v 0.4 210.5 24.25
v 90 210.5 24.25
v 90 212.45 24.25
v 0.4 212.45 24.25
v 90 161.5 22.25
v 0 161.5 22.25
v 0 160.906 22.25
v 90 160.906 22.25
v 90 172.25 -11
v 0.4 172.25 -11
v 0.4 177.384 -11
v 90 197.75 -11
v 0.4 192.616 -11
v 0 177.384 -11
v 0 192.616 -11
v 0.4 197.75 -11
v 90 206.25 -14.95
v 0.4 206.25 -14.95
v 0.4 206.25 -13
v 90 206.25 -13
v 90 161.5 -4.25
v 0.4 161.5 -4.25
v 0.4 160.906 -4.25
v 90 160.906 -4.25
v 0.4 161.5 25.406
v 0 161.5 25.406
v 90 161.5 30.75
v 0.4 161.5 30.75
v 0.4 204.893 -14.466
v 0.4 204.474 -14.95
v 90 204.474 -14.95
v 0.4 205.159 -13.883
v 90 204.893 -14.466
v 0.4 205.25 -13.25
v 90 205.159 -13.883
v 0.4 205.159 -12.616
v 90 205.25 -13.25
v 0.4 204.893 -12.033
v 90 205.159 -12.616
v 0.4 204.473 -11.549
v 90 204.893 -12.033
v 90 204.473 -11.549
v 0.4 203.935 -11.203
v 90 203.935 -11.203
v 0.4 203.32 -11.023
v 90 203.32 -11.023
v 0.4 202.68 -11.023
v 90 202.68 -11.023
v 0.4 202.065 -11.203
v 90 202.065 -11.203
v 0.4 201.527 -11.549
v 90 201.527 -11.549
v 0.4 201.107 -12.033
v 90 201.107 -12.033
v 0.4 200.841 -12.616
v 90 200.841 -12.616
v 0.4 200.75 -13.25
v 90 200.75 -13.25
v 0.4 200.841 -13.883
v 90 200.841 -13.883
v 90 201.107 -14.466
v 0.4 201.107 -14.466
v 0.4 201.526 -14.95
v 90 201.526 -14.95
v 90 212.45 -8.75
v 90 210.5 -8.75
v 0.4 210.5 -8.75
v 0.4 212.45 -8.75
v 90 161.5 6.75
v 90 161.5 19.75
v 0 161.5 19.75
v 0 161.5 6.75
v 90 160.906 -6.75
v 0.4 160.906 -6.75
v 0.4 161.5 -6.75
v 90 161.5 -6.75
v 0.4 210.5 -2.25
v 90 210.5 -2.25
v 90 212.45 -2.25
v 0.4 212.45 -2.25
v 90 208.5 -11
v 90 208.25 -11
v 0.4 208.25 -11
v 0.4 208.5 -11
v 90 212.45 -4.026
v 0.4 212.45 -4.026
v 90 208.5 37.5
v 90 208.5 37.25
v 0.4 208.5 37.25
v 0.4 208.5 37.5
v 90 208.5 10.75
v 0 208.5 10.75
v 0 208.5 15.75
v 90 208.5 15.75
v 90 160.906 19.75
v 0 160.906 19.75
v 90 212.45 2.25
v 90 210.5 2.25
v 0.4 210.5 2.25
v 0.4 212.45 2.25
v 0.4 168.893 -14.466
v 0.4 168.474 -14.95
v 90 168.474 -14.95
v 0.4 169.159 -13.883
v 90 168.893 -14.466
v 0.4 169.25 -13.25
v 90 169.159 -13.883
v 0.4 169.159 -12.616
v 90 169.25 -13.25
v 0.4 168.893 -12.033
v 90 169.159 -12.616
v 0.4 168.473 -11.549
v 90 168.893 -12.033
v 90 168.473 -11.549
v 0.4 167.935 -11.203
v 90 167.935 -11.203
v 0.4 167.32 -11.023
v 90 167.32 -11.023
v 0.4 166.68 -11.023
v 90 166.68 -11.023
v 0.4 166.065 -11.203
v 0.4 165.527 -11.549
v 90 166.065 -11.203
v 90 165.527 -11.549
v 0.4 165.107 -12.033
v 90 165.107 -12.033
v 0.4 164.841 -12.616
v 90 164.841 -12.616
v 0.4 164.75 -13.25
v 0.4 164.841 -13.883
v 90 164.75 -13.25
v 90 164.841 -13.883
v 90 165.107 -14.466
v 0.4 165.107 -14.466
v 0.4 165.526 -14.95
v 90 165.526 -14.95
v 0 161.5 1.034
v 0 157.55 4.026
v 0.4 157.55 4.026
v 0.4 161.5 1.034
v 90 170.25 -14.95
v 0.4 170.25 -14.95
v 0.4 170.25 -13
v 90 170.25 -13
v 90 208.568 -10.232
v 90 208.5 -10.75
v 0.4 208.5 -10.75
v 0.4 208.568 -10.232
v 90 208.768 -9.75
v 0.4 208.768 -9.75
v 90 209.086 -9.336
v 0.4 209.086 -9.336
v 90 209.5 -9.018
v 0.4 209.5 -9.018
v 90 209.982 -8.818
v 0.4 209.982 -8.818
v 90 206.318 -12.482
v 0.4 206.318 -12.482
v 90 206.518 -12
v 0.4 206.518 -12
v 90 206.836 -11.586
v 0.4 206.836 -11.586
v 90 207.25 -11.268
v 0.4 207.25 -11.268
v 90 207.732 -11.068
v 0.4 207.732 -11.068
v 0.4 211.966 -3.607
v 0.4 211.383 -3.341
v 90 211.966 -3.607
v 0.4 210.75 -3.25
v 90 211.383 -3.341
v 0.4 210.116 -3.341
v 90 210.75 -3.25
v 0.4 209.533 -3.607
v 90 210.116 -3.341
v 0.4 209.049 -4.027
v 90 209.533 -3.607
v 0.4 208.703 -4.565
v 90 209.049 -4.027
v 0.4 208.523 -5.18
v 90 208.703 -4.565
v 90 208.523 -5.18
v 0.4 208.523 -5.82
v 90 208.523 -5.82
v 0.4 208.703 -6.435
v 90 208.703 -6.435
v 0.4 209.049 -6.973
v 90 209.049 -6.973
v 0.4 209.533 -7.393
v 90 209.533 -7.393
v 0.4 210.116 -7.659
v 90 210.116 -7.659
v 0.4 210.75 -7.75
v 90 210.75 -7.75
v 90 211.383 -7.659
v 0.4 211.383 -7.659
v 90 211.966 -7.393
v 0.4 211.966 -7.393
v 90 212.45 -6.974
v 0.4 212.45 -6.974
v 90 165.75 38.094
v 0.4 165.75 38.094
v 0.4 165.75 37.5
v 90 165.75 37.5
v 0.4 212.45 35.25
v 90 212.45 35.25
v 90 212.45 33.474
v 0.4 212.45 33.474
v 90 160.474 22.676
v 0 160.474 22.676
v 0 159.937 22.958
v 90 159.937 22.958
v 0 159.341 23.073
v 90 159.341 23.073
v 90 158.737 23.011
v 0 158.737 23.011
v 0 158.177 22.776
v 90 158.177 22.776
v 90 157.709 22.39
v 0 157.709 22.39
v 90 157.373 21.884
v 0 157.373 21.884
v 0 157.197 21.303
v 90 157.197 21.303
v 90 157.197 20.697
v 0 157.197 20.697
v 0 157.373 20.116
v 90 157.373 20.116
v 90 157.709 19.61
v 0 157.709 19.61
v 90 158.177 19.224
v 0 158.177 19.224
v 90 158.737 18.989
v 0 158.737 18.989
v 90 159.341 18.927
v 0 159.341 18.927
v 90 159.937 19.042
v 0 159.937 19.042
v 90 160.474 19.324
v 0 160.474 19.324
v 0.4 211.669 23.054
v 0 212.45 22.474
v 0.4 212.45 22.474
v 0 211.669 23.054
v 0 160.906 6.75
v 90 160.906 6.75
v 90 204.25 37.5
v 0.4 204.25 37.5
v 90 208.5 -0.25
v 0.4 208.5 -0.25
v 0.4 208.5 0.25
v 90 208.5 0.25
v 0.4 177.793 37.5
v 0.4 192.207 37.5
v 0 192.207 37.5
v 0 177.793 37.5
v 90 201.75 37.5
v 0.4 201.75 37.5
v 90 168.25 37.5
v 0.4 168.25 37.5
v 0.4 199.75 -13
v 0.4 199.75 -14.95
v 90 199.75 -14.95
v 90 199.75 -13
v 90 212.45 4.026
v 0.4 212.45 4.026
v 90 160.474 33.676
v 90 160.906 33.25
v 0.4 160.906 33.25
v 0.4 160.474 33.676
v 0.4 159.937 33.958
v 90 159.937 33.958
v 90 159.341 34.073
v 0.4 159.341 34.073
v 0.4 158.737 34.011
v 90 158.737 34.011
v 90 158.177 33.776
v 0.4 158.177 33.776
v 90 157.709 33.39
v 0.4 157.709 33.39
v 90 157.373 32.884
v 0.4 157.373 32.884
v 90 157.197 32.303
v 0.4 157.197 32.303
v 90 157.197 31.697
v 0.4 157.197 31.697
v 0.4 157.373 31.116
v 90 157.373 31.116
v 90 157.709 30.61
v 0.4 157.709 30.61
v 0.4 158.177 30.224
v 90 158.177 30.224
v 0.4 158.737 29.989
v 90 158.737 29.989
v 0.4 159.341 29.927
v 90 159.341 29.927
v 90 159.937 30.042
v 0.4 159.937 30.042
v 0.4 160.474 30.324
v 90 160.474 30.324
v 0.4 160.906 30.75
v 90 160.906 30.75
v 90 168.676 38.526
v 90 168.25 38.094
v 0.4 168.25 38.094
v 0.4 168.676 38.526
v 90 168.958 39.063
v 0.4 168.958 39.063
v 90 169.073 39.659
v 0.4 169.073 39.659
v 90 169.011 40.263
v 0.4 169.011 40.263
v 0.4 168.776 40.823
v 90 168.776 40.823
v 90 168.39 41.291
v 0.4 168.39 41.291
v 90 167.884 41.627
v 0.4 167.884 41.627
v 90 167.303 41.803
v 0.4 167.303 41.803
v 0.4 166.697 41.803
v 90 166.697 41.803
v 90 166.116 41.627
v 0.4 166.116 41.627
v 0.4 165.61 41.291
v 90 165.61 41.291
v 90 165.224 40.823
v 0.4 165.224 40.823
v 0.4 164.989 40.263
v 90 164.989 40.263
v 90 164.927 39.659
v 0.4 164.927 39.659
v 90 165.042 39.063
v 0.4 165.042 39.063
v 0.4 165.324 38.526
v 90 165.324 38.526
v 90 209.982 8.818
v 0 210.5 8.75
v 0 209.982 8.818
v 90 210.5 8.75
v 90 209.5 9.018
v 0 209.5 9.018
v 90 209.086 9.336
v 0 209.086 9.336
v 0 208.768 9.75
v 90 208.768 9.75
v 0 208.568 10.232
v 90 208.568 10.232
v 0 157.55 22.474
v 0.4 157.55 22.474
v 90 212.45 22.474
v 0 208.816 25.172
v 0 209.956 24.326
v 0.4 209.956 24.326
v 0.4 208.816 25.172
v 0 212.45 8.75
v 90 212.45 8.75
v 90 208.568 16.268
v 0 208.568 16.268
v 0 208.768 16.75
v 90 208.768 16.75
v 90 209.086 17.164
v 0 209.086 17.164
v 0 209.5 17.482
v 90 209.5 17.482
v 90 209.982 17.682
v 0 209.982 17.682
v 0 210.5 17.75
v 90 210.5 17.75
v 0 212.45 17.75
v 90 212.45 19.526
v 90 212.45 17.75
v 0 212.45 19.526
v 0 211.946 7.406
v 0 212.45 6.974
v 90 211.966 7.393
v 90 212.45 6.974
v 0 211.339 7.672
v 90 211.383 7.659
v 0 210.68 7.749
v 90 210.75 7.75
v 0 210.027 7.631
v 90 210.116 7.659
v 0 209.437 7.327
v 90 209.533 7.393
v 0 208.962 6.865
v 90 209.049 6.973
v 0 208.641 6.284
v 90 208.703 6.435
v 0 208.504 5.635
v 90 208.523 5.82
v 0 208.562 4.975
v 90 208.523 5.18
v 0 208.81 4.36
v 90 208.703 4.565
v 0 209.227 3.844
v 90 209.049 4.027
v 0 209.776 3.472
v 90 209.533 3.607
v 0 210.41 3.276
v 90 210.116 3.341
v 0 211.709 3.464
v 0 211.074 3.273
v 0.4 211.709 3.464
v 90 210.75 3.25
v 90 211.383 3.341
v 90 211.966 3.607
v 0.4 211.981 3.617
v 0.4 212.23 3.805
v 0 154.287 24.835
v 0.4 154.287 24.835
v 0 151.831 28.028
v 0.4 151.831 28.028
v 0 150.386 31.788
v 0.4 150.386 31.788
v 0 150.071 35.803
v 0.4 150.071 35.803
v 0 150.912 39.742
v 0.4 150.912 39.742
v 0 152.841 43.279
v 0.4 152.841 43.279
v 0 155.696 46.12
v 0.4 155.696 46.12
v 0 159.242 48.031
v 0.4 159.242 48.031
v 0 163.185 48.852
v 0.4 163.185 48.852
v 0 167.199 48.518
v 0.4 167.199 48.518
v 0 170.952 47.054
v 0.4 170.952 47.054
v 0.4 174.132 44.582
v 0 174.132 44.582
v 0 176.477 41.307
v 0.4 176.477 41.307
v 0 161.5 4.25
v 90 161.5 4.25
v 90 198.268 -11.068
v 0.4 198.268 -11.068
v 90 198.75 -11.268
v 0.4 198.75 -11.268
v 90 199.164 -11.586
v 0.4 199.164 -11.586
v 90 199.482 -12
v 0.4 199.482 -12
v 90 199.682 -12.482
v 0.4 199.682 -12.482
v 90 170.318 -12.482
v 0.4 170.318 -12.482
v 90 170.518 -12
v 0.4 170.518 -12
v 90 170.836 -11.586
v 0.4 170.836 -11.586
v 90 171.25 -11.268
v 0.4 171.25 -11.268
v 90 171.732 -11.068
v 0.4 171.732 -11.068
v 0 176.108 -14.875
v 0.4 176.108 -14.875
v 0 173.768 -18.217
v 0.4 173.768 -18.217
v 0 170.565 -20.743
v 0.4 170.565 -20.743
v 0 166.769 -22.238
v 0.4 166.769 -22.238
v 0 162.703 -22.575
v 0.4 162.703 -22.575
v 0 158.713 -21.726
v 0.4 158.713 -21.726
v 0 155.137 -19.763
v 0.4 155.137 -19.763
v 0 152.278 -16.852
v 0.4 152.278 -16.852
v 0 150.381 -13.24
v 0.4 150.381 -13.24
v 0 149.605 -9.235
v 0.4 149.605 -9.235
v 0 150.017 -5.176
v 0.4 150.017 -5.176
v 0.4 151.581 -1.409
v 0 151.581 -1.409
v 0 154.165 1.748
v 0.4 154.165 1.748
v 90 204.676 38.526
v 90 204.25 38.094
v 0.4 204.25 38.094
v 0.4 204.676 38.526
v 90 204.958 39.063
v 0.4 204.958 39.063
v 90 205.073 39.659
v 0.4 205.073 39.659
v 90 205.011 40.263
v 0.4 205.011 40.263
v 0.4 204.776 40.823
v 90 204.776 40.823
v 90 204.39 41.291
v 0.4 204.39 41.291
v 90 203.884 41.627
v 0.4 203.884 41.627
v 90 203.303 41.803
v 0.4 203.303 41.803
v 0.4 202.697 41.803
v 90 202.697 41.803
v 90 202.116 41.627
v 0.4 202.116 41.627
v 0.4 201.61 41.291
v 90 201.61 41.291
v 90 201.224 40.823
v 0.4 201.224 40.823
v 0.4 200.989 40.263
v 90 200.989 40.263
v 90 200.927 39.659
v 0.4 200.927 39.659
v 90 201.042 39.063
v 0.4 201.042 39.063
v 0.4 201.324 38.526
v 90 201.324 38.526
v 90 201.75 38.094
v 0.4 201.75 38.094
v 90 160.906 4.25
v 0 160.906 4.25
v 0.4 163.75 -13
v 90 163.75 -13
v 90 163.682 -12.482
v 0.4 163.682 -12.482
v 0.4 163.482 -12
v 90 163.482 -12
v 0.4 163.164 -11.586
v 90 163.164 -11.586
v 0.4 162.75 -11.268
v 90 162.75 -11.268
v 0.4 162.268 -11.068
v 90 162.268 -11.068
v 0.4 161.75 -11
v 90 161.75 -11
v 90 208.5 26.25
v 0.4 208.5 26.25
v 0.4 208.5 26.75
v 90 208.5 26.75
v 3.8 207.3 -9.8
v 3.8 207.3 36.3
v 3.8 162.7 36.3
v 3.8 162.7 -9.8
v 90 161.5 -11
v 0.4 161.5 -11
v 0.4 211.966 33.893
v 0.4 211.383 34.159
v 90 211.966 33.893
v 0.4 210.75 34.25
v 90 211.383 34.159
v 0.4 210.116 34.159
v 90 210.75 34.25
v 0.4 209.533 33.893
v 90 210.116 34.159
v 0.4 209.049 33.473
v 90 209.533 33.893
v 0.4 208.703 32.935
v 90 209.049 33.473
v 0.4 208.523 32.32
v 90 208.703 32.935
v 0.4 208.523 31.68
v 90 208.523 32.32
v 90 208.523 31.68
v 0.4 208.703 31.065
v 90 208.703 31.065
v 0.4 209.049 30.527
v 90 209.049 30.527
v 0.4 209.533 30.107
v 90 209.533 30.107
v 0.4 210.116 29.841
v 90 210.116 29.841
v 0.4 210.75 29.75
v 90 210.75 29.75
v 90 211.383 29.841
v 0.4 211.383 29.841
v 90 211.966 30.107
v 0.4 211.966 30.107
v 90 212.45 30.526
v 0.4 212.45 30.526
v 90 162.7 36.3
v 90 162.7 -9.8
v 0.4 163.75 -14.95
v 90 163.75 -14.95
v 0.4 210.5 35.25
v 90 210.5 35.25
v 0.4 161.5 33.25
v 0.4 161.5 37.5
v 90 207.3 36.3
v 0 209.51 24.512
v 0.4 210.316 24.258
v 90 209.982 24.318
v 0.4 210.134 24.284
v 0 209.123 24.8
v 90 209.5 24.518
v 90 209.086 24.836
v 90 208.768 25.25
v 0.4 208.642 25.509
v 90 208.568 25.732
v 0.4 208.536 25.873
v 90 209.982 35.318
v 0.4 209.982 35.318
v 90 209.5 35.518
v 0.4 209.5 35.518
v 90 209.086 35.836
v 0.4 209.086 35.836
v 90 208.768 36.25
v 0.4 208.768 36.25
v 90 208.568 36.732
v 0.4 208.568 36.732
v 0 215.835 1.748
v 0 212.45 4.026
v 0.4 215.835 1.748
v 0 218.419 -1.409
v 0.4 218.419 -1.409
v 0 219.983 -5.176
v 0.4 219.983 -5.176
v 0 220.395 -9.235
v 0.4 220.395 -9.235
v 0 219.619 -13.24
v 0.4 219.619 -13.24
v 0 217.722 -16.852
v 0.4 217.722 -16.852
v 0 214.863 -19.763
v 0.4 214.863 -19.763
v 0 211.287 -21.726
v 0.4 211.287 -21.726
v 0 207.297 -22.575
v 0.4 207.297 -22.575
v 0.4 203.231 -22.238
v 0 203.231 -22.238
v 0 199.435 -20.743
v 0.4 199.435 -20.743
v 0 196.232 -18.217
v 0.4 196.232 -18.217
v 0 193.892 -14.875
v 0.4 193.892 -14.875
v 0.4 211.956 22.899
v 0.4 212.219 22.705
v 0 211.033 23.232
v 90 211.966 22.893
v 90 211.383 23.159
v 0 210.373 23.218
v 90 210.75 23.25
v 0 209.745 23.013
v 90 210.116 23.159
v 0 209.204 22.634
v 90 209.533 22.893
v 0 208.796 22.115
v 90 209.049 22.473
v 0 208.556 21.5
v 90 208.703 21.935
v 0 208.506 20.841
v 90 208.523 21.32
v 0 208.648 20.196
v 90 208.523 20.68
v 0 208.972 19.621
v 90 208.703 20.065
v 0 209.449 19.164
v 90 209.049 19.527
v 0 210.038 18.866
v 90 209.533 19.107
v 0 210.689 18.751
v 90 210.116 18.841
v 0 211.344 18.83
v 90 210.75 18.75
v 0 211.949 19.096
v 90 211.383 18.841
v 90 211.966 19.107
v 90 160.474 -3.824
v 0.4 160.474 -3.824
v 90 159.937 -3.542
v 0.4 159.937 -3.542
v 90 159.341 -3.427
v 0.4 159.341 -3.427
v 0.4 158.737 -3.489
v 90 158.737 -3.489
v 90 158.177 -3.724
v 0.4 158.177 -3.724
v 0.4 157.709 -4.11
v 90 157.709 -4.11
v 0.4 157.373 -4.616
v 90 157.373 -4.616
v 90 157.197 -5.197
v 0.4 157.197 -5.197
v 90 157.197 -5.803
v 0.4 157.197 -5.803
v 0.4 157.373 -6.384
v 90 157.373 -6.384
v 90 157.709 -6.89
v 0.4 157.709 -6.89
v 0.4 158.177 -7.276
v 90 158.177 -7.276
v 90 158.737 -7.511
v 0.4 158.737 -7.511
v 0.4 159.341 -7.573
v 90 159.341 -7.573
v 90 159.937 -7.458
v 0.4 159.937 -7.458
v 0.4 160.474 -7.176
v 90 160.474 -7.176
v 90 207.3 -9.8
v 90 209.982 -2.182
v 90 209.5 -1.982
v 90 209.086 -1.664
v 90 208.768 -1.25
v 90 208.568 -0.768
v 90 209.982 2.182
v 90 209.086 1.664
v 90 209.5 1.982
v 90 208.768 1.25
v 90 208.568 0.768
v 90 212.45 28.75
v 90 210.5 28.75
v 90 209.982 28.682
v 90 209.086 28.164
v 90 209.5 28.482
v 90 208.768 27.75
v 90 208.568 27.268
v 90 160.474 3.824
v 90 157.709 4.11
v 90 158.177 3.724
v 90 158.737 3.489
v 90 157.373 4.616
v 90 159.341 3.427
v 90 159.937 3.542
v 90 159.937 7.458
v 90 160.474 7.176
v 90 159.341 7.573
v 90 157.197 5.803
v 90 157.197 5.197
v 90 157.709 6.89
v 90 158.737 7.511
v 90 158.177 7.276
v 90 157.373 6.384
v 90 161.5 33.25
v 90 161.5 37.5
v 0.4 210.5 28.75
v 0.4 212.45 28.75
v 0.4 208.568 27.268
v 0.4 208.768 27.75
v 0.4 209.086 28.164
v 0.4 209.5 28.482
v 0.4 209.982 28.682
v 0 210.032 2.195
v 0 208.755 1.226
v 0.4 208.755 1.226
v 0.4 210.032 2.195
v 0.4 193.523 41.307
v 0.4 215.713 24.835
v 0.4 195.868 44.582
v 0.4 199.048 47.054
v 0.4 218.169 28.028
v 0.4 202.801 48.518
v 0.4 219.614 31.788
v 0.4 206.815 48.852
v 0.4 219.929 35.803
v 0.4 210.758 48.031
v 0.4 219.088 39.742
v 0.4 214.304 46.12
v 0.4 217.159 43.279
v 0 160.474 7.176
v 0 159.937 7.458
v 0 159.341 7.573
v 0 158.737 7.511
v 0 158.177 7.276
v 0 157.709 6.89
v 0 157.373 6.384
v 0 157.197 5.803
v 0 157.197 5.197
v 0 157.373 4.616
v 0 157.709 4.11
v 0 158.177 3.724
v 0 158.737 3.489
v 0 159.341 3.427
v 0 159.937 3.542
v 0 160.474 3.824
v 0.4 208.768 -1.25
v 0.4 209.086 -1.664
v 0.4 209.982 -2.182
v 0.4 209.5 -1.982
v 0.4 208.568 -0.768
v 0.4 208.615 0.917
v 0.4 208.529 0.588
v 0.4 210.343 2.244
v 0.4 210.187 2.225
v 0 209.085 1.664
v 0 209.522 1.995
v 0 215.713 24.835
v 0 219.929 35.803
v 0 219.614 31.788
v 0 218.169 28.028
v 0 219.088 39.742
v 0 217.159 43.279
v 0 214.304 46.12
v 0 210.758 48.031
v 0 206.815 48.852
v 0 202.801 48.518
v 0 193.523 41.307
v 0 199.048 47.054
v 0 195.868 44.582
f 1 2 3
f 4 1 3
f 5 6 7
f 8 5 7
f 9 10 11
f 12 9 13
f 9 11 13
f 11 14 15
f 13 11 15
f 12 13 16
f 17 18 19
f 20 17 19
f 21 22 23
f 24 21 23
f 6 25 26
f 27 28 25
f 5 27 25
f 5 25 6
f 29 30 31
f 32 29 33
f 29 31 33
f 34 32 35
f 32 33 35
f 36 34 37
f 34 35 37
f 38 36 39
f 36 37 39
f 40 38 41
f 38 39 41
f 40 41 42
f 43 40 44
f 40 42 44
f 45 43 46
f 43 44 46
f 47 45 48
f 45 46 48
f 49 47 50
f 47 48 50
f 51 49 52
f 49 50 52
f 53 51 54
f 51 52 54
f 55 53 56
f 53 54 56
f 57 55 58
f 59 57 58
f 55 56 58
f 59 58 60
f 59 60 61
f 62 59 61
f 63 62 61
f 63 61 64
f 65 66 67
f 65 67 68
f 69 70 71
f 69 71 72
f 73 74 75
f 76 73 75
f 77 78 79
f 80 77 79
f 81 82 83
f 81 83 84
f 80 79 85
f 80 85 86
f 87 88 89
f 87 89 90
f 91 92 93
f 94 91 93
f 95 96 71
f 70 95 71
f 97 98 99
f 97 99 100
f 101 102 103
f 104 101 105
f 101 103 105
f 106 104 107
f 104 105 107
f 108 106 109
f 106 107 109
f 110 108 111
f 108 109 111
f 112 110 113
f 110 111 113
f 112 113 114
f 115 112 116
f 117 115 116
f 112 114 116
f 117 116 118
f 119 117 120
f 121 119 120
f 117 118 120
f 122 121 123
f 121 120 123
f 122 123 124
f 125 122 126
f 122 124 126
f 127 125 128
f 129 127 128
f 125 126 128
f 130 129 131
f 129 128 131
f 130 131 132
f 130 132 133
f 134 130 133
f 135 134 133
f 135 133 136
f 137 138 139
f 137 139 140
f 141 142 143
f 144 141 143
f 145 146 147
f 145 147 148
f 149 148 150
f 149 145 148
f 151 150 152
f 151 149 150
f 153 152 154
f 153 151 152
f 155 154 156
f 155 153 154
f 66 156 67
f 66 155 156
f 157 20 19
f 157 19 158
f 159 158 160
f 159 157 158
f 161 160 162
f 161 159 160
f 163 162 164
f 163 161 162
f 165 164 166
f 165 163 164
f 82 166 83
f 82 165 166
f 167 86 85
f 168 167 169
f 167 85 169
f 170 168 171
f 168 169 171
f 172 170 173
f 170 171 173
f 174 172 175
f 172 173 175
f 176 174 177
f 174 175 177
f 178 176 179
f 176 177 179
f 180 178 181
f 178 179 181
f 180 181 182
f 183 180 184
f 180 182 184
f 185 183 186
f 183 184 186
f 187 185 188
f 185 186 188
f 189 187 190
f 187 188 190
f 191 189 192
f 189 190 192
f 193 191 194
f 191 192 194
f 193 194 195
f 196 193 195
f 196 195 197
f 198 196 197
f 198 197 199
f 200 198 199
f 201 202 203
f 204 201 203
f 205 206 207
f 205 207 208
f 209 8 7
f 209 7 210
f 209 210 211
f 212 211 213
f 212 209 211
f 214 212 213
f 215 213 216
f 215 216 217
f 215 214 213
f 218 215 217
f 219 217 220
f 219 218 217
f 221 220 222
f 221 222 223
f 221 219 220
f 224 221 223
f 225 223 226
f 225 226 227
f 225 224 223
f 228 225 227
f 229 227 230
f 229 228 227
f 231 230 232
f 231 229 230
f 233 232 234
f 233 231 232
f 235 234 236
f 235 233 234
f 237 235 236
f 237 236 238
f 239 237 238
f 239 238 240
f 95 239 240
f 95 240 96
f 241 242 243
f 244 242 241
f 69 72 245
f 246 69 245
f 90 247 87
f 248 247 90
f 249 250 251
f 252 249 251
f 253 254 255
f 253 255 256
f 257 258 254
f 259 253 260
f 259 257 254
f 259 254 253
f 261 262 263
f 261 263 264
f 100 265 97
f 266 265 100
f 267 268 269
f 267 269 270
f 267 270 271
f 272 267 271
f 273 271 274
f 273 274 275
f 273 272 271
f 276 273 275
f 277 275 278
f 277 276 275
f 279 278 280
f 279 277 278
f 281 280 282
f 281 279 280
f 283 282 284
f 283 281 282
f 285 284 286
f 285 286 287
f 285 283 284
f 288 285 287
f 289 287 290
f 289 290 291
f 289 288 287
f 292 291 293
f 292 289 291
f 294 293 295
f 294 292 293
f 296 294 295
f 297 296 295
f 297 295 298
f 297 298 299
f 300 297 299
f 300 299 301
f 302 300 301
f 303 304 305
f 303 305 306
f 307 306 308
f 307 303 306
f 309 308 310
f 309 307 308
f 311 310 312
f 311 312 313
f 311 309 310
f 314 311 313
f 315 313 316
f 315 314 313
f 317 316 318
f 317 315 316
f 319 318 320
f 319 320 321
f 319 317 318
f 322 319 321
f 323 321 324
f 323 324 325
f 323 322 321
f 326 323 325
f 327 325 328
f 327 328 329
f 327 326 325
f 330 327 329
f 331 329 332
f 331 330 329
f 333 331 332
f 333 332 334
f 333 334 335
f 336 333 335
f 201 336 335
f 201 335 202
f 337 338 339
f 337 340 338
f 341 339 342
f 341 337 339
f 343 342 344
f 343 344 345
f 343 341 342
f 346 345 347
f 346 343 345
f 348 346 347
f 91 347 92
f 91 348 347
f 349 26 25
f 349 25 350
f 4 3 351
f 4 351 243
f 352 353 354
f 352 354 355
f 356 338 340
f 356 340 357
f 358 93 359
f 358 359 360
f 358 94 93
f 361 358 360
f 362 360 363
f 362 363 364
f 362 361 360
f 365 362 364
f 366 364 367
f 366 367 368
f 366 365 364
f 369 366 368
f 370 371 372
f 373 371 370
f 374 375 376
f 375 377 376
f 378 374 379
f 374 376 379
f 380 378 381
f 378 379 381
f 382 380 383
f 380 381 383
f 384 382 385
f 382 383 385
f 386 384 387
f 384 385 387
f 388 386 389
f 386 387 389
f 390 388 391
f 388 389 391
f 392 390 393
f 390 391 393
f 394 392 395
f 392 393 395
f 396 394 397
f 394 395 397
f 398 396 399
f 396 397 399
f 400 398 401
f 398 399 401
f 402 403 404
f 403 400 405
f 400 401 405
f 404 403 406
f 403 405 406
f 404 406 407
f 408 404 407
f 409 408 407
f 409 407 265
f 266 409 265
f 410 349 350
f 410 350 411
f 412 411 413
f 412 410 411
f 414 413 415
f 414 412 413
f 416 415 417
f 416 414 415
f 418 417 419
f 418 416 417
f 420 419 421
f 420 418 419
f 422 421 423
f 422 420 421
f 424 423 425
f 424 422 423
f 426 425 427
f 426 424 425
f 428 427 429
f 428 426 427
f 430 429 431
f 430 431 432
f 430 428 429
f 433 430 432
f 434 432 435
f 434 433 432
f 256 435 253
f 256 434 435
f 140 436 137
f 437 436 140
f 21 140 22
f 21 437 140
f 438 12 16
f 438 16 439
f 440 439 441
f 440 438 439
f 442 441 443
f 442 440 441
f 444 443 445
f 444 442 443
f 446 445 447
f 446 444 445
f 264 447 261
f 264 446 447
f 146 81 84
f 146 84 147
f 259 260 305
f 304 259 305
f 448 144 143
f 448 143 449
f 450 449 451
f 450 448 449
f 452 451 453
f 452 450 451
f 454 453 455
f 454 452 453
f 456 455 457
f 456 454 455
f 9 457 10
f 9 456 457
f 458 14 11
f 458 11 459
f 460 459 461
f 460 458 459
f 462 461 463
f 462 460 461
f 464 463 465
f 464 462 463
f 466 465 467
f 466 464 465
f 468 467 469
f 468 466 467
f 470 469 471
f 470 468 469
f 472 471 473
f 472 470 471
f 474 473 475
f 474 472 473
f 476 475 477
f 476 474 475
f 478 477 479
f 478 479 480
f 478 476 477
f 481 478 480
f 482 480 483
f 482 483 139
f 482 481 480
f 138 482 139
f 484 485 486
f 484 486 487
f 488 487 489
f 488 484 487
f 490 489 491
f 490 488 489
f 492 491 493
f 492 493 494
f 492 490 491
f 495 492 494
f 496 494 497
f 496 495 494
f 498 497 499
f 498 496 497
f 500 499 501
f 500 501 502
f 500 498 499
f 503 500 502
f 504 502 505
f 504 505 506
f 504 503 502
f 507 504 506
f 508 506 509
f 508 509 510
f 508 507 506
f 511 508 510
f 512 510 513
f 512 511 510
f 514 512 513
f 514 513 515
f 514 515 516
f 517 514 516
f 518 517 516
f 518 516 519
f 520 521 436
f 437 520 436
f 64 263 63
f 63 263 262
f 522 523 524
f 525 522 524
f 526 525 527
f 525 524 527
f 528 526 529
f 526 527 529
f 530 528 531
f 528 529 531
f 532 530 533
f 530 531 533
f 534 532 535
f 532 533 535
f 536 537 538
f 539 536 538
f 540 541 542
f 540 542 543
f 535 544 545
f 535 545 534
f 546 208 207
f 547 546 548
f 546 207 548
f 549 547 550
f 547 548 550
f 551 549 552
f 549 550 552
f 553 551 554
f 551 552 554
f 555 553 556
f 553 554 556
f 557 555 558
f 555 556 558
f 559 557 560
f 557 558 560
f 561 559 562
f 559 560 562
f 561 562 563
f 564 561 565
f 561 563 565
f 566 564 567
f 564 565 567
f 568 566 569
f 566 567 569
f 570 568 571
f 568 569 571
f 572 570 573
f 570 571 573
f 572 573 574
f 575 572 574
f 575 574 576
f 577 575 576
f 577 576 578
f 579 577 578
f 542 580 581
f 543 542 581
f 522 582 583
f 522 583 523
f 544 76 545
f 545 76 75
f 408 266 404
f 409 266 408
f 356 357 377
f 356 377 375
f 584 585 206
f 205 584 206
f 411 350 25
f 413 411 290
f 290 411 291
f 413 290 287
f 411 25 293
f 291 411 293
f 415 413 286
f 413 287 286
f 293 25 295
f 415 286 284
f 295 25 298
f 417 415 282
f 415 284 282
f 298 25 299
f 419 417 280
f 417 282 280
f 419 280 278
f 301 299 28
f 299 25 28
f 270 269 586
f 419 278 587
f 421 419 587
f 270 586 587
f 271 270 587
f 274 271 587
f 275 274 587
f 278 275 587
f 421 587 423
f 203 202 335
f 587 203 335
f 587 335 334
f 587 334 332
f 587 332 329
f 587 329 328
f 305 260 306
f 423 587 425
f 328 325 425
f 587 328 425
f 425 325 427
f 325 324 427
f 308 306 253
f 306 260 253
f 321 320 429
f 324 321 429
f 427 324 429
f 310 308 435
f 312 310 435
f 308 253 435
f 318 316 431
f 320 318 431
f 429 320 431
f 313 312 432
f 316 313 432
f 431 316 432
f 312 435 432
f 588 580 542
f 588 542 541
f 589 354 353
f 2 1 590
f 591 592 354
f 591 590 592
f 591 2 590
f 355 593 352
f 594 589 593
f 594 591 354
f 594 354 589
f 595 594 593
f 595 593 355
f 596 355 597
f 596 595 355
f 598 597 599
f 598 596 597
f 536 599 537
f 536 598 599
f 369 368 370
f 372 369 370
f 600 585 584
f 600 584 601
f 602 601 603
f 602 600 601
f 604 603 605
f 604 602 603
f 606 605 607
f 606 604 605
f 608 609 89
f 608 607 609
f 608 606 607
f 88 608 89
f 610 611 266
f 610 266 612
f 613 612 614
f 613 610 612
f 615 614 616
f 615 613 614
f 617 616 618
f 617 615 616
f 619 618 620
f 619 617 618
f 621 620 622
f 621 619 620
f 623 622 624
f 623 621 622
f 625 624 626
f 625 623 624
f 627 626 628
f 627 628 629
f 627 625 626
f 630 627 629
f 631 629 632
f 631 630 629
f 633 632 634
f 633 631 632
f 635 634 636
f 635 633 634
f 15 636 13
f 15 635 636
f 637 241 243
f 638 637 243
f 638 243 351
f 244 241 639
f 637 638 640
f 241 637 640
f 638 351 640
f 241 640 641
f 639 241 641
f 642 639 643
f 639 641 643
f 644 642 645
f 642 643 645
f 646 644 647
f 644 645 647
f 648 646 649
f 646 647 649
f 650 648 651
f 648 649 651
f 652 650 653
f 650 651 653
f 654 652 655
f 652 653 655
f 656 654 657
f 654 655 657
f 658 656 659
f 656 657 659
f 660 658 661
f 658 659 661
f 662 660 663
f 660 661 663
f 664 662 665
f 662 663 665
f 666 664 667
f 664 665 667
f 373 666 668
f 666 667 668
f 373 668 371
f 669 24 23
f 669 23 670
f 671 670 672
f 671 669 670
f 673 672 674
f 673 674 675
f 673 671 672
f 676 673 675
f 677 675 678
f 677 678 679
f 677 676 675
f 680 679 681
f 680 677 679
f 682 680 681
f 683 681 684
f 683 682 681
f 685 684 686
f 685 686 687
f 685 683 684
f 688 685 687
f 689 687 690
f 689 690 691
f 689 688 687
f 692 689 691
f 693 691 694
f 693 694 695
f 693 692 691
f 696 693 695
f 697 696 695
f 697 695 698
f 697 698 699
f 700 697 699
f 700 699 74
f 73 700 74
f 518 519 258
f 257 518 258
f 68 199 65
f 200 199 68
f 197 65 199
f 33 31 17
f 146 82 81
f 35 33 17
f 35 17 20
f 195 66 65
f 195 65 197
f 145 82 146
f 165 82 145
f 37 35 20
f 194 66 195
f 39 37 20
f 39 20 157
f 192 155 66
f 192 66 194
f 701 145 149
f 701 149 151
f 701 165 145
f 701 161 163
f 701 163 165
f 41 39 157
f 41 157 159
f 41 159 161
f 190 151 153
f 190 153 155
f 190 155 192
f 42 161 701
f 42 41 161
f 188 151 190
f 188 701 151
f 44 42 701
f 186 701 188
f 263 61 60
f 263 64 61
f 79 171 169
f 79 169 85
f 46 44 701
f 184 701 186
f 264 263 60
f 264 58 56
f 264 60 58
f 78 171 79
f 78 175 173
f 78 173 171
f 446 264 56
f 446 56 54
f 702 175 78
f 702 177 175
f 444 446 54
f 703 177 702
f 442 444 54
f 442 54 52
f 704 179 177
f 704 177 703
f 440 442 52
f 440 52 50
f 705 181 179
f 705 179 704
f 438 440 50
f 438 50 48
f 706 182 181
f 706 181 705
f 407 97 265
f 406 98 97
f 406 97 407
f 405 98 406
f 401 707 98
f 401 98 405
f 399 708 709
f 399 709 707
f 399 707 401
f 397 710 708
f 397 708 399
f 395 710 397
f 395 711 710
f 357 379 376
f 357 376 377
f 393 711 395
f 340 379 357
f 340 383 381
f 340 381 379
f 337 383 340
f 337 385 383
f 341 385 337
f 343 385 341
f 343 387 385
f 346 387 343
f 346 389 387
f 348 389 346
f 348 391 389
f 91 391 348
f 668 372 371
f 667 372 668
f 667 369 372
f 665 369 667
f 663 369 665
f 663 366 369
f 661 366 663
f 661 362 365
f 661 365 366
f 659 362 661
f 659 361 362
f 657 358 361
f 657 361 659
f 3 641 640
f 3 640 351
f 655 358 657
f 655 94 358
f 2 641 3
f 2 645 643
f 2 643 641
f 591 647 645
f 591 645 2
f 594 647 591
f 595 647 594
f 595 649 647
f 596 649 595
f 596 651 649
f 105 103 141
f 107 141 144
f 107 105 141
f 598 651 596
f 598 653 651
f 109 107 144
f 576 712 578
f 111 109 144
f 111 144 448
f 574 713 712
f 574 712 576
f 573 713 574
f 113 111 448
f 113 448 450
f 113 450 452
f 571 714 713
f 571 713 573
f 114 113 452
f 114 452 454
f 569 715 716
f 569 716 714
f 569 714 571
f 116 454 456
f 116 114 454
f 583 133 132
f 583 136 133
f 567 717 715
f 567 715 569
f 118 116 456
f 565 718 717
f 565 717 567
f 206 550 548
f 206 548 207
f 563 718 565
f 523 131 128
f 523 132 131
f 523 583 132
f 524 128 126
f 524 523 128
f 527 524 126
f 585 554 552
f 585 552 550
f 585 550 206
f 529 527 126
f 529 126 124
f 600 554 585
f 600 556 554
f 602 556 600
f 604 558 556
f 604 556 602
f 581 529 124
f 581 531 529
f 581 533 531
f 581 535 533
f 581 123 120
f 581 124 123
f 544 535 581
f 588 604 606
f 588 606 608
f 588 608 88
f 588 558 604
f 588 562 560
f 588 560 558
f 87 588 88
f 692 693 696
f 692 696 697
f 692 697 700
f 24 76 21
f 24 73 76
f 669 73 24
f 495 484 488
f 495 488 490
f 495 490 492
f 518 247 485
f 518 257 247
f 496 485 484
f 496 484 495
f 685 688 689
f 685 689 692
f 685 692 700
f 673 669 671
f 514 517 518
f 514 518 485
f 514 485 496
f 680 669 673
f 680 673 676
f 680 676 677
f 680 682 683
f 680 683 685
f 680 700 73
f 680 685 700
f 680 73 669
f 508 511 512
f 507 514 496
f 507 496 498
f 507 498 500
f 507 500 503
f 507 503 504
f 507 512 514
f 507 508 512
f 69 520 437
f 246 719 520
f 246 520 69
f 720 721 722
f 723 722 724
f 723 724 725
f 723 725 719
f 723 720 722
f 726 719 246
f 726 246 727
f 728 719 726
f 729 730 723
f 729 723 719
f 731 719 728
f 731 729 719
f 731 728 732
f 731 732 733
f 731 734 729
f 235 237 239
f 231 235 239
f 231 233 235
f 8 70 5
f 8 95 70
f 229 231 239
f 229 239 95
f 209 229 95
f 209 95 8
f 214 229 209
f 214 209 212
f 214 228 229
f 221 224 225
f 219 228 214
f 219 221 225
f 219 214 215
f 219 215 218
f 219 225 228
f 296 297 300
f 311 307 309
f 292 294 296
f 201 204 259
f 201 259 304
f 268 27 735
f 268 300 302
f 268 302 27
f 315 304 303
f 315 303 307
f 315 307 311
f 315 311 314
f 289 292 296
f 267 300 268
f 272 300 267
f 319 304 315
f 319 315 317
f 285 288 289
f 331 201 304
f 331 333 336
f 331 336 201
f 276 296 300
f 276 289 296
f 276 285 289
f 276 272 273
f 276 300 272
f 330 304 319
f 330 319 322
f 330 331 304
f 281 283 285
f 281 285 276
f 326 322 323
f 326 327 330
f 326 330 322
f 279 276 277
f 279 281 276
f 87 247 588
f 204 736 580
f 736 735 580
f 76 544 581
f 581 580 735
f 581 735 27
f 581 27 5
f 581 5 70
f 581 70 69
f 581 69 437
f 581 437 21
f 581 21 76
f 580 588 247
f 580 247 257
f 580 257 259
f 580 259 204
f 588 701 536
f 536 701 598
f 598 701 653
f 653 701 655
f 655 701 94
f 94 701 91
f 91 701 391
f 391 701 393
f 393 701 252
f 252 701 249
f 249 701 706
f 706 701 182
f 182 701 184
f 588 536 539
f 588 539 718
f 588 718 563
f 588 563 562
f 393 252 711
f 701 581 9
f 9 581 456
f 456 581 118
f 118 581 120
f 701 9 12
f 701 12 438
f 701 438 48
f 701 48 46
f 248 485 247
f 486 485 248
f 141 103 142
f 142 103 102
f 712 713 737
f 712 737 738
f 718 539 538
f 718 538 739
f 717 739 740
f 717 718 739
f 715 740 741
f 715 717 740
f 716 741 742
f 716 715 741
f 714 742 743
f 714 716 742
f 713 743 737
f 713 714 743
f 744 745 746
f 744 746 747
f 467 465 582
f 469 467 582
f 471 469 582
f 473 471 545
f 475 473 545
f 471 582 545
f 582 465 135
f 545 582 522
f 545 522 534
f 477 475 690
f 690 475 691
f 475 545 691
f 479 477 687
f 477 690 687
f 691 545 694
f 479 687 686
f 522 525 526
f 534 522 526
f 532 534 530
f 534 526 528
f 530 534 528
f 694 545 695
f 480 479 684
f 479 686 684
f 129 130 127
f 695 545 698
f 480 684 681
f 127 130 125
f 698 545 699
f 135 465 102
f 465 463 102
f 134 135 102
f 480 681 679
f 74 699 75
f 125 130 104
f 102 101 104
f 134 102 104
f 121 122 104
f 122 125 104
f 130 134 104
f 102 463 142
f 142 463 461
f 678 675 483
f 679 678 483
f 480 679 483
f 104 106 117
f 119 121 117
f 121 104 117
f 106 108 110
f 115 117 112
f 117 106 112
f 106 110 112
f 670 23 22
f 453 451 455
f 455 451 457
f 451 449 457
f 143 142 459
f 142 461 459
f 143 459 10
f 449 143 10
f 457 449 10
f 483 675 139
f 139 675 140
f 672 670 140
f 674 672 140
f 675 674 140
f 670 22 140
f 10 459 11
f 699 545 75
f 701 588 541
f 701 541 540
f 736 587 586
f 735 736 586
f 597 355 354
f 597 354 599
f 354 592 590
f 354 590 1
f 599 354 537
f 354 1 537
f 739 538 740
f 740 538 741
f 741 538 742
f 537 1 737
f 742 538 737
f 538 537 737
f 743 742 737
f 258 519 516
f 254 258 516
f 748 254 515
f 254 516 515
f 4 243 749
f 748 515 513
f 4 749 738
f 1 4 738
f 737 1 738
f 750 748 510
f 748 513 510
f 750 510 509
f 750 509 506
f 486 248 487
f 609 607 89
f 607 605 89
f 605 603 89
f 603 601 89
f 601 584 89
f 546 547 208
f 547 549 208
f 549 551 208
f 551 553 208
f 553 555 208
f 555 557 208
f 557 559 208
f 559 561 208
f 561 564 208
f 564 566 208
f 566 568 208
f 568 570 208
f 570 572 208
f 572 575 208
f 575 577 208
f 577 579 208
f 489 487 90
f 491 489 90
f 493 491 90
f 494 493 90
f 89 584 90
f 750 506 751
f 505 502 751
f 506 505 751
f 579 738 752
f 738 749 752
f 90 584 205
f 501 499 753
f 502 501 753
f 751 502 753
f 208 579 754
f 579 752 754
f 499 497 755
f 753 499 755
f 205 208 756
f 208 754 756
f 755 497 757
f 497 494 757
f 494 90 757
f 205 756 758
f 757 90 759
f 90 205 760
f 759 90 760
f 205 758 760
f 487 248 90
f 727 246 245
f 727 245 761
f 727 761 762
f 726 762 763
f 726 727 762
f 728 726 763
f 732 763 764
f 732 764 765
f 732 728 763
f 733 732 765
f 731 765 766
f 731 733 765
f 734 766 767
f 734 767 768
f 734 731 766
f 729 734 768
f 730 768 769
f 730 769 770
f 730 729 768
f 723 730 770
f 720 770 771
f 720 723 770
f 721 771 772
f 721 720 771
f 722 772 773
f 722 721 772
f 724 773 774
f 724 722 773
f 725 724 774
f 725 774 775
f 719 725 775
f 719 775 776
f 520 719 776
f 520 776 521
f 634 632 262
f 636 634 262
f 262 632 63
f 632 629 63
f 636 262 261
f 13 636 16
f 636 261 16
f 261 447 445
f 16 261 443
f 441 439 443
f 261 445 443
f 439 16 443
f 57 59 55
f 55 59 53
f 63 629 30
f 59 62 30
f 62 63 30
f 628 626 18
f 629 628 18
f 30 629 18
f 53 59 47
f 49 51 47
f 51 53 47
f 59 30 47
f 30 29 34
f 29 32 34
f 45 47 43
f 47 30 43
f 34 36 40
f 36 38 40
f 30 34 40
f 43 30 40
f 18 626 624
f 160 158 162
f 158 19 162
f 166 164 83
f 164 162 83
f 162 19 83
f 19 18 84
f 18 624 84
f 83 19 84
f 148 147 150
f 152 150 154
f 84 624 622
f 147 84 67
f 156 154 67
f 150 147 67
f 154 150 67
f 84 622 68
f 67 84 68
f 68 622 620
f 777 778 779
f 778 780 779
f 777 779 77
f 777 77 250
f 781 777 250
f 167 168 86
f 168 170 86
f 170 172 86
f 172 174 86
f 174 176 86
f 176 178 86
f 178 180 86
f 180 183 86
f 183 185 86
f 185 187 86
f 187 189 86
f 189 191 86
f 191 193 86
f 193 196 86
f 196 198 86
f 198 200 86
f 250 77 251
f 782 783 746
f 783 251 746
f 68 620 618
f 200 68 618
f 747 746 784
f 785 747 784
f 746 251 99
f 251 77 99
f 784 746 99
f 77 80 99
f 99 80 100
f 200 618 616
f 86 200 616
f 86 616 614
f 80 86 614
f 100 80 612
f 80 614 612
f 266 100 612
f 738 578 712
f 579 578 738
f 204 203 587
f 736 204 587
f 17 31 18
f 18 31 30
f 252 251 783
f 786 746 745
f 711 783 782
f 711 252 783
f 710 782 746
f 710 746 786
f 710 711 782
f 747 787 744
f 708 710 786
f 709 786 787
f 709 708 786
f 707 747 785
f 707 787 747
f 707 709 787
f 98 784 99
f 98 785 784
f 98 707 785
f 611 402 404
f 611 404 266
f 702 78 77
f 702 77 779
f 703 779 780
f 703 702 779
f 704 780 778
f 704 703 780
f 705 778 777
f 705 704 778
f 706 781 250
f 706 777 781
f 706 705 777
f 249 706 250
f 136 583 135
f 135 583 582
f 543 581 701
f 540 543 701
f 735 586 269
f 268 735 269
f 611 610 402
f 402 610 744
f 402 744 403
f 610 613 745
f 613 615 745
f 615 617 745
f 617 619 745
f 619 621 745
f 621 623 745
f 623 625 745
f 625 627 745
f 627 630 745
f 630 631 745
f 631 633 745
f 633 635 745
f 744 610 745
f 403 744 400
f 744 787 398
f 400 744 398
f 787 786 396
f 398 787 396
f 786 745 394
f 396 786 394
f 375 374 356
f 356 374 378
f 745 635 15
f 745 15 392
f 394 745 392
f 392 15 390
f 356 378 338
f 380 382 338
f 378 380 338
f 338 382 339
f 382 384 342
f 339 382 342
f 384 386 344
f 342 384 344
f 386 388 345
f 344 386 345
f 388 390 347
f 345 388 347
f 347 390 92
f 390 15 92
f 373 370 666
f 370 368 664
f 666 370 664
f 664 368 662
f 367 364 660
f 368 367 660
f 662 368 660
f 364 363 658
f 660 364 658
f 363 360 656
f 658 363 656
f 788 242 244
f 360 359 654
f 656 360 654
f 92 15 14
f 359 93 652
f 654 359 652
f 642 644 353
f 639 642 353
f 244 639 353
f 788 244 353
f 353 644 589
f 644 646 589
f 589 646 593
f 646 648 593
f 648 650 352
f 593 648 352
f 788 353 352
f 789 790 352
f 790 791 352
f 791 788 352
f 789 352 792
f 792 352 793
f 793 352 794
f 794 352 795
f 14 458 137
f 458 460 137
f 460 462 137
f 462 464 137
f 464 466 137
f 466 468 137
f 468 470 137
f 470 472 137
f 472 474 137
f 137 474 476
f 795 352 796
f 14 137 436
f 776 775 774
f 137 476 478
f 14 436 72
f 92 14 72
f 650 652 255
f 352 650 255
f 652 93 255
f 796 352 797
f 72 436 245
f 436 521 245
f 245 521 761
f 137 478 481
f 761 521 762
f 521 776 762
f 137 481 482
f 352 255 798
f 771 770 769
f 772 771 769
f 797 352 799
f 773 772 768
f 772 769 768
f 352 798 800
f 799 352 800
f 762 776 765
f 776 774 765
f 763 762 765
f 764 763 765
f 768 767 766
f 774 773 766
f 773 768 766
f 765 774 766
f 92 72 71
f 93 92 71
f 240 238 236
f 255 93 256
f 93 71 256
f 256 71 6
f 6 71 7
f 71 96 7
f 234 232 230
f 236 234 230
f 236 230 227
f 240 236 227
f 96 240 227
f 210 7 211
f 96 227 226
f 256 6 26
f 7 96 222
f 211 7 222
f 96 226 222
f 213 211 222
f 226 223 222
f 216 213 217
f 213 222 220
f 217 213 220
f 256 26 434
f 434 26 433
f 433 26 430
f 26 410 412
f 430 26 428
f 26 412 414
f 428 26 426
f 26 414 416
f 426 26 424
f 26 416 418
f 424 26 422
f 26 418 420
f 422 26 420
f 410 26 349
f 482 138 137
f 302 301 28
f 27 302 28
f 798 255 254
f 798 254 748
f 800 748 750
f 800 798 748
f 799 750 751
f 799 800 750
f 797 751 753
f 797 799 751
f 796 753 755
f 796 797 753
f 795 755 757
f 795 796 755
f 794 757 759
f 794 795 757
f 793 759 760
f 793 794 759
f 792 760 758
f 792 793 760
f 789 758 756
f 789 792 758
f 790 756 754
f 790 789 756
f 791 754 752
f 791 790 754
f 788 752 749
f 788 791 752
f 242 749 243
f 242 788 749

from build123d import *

# Parameters (mm, degrees)
EXTRUDE_1_DEPTH             = 90
SKETCH_2_W                  = 90
SKETCH_2_H                  = 42.75
EXTRUDE_2_DEPTH             = 8.2
SKETCH_3_W                  = 90
SKETCH_3_H                  = 52.45
EXTRUDE_3_DEPTH             = 8.2
SKETCH_4_W                  = 3.95
SKETCH_4_H                  = 2.25
CUT_EXTRUDE_1_DEPTH         = 91
SKETCH_5_W                  = 3.95
SKETCH_5_H                  = 29.5
CUT_EXTRUDE_2_DEPTH         = 91
SKETCH_6_W                  = 3.95
SKETCH_6_H                  = 6.2
CUT_EXTRUDE_3_DEPTH         = 91
SKETCH_7_W                  = 2.25
SKETCH_7_H                  = 3.95
CUT_EXTRUDE_4_DEPTH         = 91
SKETCH_8_W                  = 4.5
SKETCH_8_H                  = 3.95
CUT_EXTRUDE_5_DEPTH         = 91
SKETCH_9_W                  = 9
SKETCH_9_H                  = 3.95
CUT_EXTRUDE_6_DEPTH         = 91
SKETCH_10_W                 = 4.5
SKETCH_10_H                 = 3.95
CUT_EXTRUDE_7_DEPTH         = 91
SKETCH_11_W                 = 2.25
SKETCH_11_H                 = 3.95
CUT_EXTRUDE_8_DEPTH         = 91
SKETCH_12_W                 = 46.1
SKETCH_12_H                 = 44.6
CUT_EXTRUDE_9_DEPTH         = 86.2
HOLE_WIZARD_2_5_2_5_1_D     = 2.5
HOLE_WIZARD_2_5_2_5_1_DEPTH = 90
HOLE_WIZARD_4_5_4_5_1_D     = 4.5
HOLE_WIZARD_4_5_4_5_1_DEPTH = 90
SKETCH_19_R                 = 1.67252853
SKETCH_19_R_2               = 1.459159852
SKETCH_19_R_3               = 1.459908976
SKETCH_19_R_4               = 1.592821911
SKETCH_19_R_5               = 1.532216665
SKETCH_19_R_6               = 1.596138091
EXTRUDE_4_DEPTH             = 90
FILLET_1_R                  = 2
FILLET_2_R                  = 2
FILLET_3_R                  = 2
FILLET_4_R                  = 2
FILLET_5_R                  = 2
FILLET_6_R                  = 2
FILLET_7_R                  = 2
FILLET_8_R                  = 2
FILLET_9_R                  = 2
FILLET_10_R                 = 2
FILLET_11_R                 = 2
FILLET_12_R                 = 2
EXTRUDE_5_DEPTH             = 0.4


with BuildPart() as part:
    # Эскиз1 → Бобышка-Вытянуть1 (new body)
    with BuildSketch(Plane(origin=(90, 0, 0), x_dir=(0, 0, -1), z_dir=(1, 0, 0))):
        with BuildLine():
            Line((6.75, 160.906238208), (6.75, 204.25))
            Line((6.75, 204.25), (-38.093761792, 204.25))
            ThreePointArc((-38.093761792, 204.25), (-41.825, 203), (-38.093761792, 201.75))
            Line((-38.093761792, 201.75), (-37.5, 201.75))
            Line((-37.5, 201.75), (-37.5, 168.25))
            Line((-37.5, 168.25), (-38.093761792, 168.25))
            ThreePointArc((-38.093761792, 168.25), (-41.825, 167), (-38.093761792, 165.75))
            Line((-38.093761792, 165.75), (-37.5, 165.75))
            Line((-37.5, 165.75), (-37.5, 161.5))
            Line((-37.5, 161.5), (-33.25, 161.5))
            Line((-33.25, 161.5), (-33.25, 160.906238208))
            ThreePointArc((-33.25, 160.906238208), (-32, 157.175), (-30.75, 160.906238208))
            Line((-30.75, 160.906238208), (-30.75, 161.5))
            Line((-30.75, 161.5), (-22.25, 161.5))
            Line((-22.25, 161.5), (-22.25, 160.906238208))
            ThreePointArc((-22.25, 160.906238208), (-21, 157.175), (-19.75, 160.906238208))
            Line((-19.75, 160.906238208), (-19.75, 161.5))
            Line((-19.75, 161.5), (-6.75, 161.5))
            Line((-6.75, 161.5), (-6.75, 160.906238208))
            ThreePointArc((-6.75, 160.906238208), (-5.5, 157.175), (-4.25, 160.906238208))
            Line((-4.25, 160.906238208), (-4.25, 161.5))
            Line((-4.25, 161.5), (4.25, 161.5))
            Line((4.25, 161.5), (4.25, 160.906238208))
            ThreePointArc((4.25, 160.906238208), (5.5, 157.175), (6.75, 160.906238208))
        make_face()
    extrude(amount=-EXTRUDE_1_DEPTH)

    # Эскиз2 → Бобышка-Вытянуть2 (add)
    with BuildSketch(Plane(origin=(0, 0, -6.75), x_dir=(-1, 0, 0), z_dir=(0, 0, -1))):
        with Locations((-45, 182.875)):
            Rectangle(SKETCH_2_W, SKETCH_2_H)
    extrude(amount=EXTRUDE_2_DEPTH)

    # Эскиз3 → Бобышка-Вытянуть3 (add)
    with BuildSketch(Plane(origin=(0, 204.25, 0), x_dir=(-1, 0, 0), z_dir=(0, 1, 0))):
        with Locations((-45, 11.275)):
            Rectangle(SKETCH_3_W, SKETCH_3_H)
    extrude(amount=EXTRUDE_3_DEPTH)

    # Эскиз4 → Вырез-Вытянуть1 (cut, through all)
    with BuildSketch(Plane.ZY):
        with Locations((-12.975, 162.625)):
            Rectangle(SKETCH_4_W, SKETCH_4_H)
    extrude(amount=-CUT_EXTRUDE_1_DEPTH, mode=Mode.SUBTRACT)

    # Эскиз5 → Вырез-Вытянуть2 (cut, through all)
    with BuildSketch(Plane.ZY):
        with Locations((-12.975, 185)):
            Rectangle(SKETCH_5_W, SKETCH_5_H)
    extrude(amount=-CUT_EXTRUDE_2_DEPTH, mode=Mode.SUBTRACT)

    # Эскиз6 → Вырез-Вытянуть3 (cut, through all)
    with BuildSketch(Plane.ZY):
        with Locations((-12.975, 209.35)):
            Rectangle(SKETCH_6_W, SKETCH_6_H)
    extrude(amount=-CUT_EXTRUDE_3_DEPTH, mode=Mode.SUBTRACT)

    # Эскиз7 → Вырез-Вытянуть4 (cut, through all)
    with BuildSketch(Plane.ZY):
        with Locations((-9.875, 210.475)):
            Rectangle(SKETCH_7_W, SKETCH_7_H)
    extrude(amount=-CUT_EXTRUDE_4_DEPTH, mode=Mode.SUBTRACT)

    # Эскиз8 → Вырез-Вытянуть5 (cut, through all)
    with BuildSketch(Plane.ZY):
        with Locations((0, 210.475)):
            Rectangle(SKETCH_8_W, SKETCH_8_H)
    extrude(amount=-CUT_EXTRUDE_5_DEPTH, mode=Mode.SUBTRACT)

    # Эскиз9 → Вырез-Вытянуть6 (cut, through all)
    with BuildSketch(Plane.ZY):
        with Locations((13.25, 210.475)):
            Rectangle(SKETCH_9_W, SKETCH_9_H)
    extrude(amount=-CUT_EXTRUDE_6_DEPTH, mode=Mode.SUBTRACT)

    # Эскиз10 → Вырез-Вытянуть7 (cut, through all)
    with BuildSketch(Plane.ZY):
        with Locations((26.5, 210.475)):
            Rectangle(SKETCH_10_W, SKETCH_10_H)
    extrude(amount=-CUT_EXTRUDE_7_DEPTH, mode=Mode.SUBTRACT)

    # Эскиз11 → Вырез-Вытянуть8 (cut, through all)
    with BuildSketch(Plane.ZY):
        with Locations((36.375, 210.475)):
            Rectangle(SKETCH_11_W, SKETCH_11_H)
    extrude(amount=-CUT_EXTRUDE_8_DEPTH, mode=Mode.SUBTRACT)

    # Эскиз12 → Вырез-Вытянуть9 (cut)
    with BuildSketch(Plane(origin=(90, 0, 0), x_dir=(0, 0, -1), z_dir=(1, 0, 0))):
        with Locations((-13.25, 185)):
            Rectangle(SKETCH_12_W, SKETCH_12_H)
    extrude(amount=-CUT_EXTRUDE_9_DEPTH, mode=Mode.SUBTRACT)

    # Диаметр отверстия Ø2.5 (2.5)1
    with Locations(Plane(origin=(90, 0, 0), x_dir=(0, 0, -1), z_dir=(1, 0, 0))):
        with Locations((5.5, 159.25), (-21, 159.25), (-5.5, 159.25), (-32, 159.25), (-39.75, 167), (-39.75, 203)):
            Hole(HOLE_WIZARD_2_5_2_5_1_D / 2, depth=HOLE_WIZARD_2_5_2_5_1_DEPTH)

    # Диаметр отверстия Ø4.5 (4.5)1
    with Locations(Plane.ZY):
        with Locations((-13.25, 167), (-13.25, 203), (-5.5, 210.75), (5.5, 210.75), (21, 210.75), (32, 210.75)):
            Hole(HOLE_WIZARD_4_5_4_5_1_D / 2, depth=HOLE_WIZARD_4_5_4_5_1_DEPTH)

    # Эскиз19 → Бобышка-Вытянуть4 (add)
    with BuildSketch(Plane(origin=(90, 0, 0), x_dir=(0, 0, -1), z_dir=(1, 0, 0))):
        with Locations((-39.75, 203)):
            Circle(SKETCH_19_R)
        with Locations((-39.75, 167)):
            Circle(SKETCH_19_R_2)
        with Locations((-32, 159.25)):
            Circle(SKETCH_19_R_3)
        with Locations((-21, 159.25)):
            Circle(SKETCH_19_R_4)
        with Locations((-5.5, 159.25)):
            Circle(SKETCH_19_R_5)
        with Locations((5.5, 159.25)):
            Circle(SKETCH_19_R_6)
    extrude(amount=-EXTRUDE_4_DEPTH)

    # Скругление1
    fillet_1_edges = [part.edges().sort_by_distance(p)[0] for p in [
        (45, 208.5, -8.75),
    ]]
    fillet(fillet_1_edges, radius=FILLET_1_R)

    # Скругление2
    fillet_2_edges = [part.edges().sort_by_distance(p)[0] for p in [
        (45, 163.75, -11),
    ]]
    fillet(fillet_2_edges, radius=FILLET_2_R)

    # Скругление3
    fillet_3_edges = [part.edges().sort_by_distance(p)[0] for p in [
        (45, 170.25, -11),
    ]]
    fillet(fillet_3_edges, radius=FILLET_3_R)

    # Скругление4
    fillet_4_edges = [part.edges().sort_by_distance(p)[0] for p in [
        (45, 199.75, -11),
    ]]
    fillet(fillet_4_edges, radius=FILLET_4_R)

    # Скругление5
    fillet_5_edges = [part.edges().sort_by_distance(p)[0] for p in [
        (45, 206.25, -11),
    ]]
    fillet(fillet_5_edges, radius=FILLET_5_R)

    # Скругление6
    fillet_6_edges = [part.edges().sort_by_distance(p)[0] for p in [
        (45, 208.5, -2.25),
    ]]
    fillet(fillet_6_edges, radius=FILLET_6_R)

    # Скругление7
    fillet_7_edges = [part.edges().sort_by_distance(p)[0] for p in [
        (45, 208.5, 2.25),
    ]]
    fillet(fillet_7_edges, radius=FILLET_7_R)

    # Скругление8
    fillet_8_edges = [part.edges().sort_by_distance(p)[0] for p in [
        (45, 208.5, 8.75),
    ]]
    fillet(fillet_8_edges, radius=FILLET_8_R)

    # Скругление9
    fillet_9_edges = [part.edges().sort_by_distance(p)[0] for p in [
        (45, 208.5, 17.75),
    ]]
    fillet(fillet_9_edges, radius=FILLET_9_R)

    # Скругление10
    fillet_10_edges = [part.edges().sort_by_distance(p)[0] for p in [
        (45, 208.5, 24.25),
    ]]
    fillet(fillet_10_edges, radius=FILLET_10_R)

    # Скругление11
    fillet_11_edges = [part.edges().sort_by_distance(p)[0] for p in [
        (45, 208.5, 28.75),
    ]]
    fillet(fillet_11_edges, radius=FILLET_11_R)

    # Скругление12
    fillet_12_edges = [part.edges().sort_by_distance(p)[0] for p in [
        (45, 208.5, 35.25),
    ]]
    fillet(fillet_12_edges, radius=FILLET_12_R)

    # Эскиз21 → Бобышка-Вытянуть5 (add)
    with BuildSketch(Plane.ZY):
        with BuildLine():
            Line((-11, 192.615858601), (4.026059703, 212.45))
            ThreePointArc((4.026059703, 212.45), (-19.762874791, 214.863320113), (-11, 192.615858601))
        make_face()
        with BuildLine():
            Line((22.473940297, 212.45), (37.5, 192.207288754))
            ThreePointArc((37.5, 192.207288754), (46.120046397, 214.304143308), (22.473940297, 212.45))
        make_face()
        with BuildLine():
            Line((37.5, 177.792711246), (22.473940297, 157.55))
            ThreePointArc((22.473940297, 157.55), (46.120046397, 155.695856692), (37.5, 177.792711246))
        make_face()
        with BuildLine():
            Line((4.026059703, 157.55), (-11, 177.384141399))
            ThreePointArc((-11, 177.384141399), (-19.762874791, 155.136679887), (4.026059703, 157.55))
        make_face()
    extrude(amount=-EXTRUDE_5_DEPTH)


solid = part.part
